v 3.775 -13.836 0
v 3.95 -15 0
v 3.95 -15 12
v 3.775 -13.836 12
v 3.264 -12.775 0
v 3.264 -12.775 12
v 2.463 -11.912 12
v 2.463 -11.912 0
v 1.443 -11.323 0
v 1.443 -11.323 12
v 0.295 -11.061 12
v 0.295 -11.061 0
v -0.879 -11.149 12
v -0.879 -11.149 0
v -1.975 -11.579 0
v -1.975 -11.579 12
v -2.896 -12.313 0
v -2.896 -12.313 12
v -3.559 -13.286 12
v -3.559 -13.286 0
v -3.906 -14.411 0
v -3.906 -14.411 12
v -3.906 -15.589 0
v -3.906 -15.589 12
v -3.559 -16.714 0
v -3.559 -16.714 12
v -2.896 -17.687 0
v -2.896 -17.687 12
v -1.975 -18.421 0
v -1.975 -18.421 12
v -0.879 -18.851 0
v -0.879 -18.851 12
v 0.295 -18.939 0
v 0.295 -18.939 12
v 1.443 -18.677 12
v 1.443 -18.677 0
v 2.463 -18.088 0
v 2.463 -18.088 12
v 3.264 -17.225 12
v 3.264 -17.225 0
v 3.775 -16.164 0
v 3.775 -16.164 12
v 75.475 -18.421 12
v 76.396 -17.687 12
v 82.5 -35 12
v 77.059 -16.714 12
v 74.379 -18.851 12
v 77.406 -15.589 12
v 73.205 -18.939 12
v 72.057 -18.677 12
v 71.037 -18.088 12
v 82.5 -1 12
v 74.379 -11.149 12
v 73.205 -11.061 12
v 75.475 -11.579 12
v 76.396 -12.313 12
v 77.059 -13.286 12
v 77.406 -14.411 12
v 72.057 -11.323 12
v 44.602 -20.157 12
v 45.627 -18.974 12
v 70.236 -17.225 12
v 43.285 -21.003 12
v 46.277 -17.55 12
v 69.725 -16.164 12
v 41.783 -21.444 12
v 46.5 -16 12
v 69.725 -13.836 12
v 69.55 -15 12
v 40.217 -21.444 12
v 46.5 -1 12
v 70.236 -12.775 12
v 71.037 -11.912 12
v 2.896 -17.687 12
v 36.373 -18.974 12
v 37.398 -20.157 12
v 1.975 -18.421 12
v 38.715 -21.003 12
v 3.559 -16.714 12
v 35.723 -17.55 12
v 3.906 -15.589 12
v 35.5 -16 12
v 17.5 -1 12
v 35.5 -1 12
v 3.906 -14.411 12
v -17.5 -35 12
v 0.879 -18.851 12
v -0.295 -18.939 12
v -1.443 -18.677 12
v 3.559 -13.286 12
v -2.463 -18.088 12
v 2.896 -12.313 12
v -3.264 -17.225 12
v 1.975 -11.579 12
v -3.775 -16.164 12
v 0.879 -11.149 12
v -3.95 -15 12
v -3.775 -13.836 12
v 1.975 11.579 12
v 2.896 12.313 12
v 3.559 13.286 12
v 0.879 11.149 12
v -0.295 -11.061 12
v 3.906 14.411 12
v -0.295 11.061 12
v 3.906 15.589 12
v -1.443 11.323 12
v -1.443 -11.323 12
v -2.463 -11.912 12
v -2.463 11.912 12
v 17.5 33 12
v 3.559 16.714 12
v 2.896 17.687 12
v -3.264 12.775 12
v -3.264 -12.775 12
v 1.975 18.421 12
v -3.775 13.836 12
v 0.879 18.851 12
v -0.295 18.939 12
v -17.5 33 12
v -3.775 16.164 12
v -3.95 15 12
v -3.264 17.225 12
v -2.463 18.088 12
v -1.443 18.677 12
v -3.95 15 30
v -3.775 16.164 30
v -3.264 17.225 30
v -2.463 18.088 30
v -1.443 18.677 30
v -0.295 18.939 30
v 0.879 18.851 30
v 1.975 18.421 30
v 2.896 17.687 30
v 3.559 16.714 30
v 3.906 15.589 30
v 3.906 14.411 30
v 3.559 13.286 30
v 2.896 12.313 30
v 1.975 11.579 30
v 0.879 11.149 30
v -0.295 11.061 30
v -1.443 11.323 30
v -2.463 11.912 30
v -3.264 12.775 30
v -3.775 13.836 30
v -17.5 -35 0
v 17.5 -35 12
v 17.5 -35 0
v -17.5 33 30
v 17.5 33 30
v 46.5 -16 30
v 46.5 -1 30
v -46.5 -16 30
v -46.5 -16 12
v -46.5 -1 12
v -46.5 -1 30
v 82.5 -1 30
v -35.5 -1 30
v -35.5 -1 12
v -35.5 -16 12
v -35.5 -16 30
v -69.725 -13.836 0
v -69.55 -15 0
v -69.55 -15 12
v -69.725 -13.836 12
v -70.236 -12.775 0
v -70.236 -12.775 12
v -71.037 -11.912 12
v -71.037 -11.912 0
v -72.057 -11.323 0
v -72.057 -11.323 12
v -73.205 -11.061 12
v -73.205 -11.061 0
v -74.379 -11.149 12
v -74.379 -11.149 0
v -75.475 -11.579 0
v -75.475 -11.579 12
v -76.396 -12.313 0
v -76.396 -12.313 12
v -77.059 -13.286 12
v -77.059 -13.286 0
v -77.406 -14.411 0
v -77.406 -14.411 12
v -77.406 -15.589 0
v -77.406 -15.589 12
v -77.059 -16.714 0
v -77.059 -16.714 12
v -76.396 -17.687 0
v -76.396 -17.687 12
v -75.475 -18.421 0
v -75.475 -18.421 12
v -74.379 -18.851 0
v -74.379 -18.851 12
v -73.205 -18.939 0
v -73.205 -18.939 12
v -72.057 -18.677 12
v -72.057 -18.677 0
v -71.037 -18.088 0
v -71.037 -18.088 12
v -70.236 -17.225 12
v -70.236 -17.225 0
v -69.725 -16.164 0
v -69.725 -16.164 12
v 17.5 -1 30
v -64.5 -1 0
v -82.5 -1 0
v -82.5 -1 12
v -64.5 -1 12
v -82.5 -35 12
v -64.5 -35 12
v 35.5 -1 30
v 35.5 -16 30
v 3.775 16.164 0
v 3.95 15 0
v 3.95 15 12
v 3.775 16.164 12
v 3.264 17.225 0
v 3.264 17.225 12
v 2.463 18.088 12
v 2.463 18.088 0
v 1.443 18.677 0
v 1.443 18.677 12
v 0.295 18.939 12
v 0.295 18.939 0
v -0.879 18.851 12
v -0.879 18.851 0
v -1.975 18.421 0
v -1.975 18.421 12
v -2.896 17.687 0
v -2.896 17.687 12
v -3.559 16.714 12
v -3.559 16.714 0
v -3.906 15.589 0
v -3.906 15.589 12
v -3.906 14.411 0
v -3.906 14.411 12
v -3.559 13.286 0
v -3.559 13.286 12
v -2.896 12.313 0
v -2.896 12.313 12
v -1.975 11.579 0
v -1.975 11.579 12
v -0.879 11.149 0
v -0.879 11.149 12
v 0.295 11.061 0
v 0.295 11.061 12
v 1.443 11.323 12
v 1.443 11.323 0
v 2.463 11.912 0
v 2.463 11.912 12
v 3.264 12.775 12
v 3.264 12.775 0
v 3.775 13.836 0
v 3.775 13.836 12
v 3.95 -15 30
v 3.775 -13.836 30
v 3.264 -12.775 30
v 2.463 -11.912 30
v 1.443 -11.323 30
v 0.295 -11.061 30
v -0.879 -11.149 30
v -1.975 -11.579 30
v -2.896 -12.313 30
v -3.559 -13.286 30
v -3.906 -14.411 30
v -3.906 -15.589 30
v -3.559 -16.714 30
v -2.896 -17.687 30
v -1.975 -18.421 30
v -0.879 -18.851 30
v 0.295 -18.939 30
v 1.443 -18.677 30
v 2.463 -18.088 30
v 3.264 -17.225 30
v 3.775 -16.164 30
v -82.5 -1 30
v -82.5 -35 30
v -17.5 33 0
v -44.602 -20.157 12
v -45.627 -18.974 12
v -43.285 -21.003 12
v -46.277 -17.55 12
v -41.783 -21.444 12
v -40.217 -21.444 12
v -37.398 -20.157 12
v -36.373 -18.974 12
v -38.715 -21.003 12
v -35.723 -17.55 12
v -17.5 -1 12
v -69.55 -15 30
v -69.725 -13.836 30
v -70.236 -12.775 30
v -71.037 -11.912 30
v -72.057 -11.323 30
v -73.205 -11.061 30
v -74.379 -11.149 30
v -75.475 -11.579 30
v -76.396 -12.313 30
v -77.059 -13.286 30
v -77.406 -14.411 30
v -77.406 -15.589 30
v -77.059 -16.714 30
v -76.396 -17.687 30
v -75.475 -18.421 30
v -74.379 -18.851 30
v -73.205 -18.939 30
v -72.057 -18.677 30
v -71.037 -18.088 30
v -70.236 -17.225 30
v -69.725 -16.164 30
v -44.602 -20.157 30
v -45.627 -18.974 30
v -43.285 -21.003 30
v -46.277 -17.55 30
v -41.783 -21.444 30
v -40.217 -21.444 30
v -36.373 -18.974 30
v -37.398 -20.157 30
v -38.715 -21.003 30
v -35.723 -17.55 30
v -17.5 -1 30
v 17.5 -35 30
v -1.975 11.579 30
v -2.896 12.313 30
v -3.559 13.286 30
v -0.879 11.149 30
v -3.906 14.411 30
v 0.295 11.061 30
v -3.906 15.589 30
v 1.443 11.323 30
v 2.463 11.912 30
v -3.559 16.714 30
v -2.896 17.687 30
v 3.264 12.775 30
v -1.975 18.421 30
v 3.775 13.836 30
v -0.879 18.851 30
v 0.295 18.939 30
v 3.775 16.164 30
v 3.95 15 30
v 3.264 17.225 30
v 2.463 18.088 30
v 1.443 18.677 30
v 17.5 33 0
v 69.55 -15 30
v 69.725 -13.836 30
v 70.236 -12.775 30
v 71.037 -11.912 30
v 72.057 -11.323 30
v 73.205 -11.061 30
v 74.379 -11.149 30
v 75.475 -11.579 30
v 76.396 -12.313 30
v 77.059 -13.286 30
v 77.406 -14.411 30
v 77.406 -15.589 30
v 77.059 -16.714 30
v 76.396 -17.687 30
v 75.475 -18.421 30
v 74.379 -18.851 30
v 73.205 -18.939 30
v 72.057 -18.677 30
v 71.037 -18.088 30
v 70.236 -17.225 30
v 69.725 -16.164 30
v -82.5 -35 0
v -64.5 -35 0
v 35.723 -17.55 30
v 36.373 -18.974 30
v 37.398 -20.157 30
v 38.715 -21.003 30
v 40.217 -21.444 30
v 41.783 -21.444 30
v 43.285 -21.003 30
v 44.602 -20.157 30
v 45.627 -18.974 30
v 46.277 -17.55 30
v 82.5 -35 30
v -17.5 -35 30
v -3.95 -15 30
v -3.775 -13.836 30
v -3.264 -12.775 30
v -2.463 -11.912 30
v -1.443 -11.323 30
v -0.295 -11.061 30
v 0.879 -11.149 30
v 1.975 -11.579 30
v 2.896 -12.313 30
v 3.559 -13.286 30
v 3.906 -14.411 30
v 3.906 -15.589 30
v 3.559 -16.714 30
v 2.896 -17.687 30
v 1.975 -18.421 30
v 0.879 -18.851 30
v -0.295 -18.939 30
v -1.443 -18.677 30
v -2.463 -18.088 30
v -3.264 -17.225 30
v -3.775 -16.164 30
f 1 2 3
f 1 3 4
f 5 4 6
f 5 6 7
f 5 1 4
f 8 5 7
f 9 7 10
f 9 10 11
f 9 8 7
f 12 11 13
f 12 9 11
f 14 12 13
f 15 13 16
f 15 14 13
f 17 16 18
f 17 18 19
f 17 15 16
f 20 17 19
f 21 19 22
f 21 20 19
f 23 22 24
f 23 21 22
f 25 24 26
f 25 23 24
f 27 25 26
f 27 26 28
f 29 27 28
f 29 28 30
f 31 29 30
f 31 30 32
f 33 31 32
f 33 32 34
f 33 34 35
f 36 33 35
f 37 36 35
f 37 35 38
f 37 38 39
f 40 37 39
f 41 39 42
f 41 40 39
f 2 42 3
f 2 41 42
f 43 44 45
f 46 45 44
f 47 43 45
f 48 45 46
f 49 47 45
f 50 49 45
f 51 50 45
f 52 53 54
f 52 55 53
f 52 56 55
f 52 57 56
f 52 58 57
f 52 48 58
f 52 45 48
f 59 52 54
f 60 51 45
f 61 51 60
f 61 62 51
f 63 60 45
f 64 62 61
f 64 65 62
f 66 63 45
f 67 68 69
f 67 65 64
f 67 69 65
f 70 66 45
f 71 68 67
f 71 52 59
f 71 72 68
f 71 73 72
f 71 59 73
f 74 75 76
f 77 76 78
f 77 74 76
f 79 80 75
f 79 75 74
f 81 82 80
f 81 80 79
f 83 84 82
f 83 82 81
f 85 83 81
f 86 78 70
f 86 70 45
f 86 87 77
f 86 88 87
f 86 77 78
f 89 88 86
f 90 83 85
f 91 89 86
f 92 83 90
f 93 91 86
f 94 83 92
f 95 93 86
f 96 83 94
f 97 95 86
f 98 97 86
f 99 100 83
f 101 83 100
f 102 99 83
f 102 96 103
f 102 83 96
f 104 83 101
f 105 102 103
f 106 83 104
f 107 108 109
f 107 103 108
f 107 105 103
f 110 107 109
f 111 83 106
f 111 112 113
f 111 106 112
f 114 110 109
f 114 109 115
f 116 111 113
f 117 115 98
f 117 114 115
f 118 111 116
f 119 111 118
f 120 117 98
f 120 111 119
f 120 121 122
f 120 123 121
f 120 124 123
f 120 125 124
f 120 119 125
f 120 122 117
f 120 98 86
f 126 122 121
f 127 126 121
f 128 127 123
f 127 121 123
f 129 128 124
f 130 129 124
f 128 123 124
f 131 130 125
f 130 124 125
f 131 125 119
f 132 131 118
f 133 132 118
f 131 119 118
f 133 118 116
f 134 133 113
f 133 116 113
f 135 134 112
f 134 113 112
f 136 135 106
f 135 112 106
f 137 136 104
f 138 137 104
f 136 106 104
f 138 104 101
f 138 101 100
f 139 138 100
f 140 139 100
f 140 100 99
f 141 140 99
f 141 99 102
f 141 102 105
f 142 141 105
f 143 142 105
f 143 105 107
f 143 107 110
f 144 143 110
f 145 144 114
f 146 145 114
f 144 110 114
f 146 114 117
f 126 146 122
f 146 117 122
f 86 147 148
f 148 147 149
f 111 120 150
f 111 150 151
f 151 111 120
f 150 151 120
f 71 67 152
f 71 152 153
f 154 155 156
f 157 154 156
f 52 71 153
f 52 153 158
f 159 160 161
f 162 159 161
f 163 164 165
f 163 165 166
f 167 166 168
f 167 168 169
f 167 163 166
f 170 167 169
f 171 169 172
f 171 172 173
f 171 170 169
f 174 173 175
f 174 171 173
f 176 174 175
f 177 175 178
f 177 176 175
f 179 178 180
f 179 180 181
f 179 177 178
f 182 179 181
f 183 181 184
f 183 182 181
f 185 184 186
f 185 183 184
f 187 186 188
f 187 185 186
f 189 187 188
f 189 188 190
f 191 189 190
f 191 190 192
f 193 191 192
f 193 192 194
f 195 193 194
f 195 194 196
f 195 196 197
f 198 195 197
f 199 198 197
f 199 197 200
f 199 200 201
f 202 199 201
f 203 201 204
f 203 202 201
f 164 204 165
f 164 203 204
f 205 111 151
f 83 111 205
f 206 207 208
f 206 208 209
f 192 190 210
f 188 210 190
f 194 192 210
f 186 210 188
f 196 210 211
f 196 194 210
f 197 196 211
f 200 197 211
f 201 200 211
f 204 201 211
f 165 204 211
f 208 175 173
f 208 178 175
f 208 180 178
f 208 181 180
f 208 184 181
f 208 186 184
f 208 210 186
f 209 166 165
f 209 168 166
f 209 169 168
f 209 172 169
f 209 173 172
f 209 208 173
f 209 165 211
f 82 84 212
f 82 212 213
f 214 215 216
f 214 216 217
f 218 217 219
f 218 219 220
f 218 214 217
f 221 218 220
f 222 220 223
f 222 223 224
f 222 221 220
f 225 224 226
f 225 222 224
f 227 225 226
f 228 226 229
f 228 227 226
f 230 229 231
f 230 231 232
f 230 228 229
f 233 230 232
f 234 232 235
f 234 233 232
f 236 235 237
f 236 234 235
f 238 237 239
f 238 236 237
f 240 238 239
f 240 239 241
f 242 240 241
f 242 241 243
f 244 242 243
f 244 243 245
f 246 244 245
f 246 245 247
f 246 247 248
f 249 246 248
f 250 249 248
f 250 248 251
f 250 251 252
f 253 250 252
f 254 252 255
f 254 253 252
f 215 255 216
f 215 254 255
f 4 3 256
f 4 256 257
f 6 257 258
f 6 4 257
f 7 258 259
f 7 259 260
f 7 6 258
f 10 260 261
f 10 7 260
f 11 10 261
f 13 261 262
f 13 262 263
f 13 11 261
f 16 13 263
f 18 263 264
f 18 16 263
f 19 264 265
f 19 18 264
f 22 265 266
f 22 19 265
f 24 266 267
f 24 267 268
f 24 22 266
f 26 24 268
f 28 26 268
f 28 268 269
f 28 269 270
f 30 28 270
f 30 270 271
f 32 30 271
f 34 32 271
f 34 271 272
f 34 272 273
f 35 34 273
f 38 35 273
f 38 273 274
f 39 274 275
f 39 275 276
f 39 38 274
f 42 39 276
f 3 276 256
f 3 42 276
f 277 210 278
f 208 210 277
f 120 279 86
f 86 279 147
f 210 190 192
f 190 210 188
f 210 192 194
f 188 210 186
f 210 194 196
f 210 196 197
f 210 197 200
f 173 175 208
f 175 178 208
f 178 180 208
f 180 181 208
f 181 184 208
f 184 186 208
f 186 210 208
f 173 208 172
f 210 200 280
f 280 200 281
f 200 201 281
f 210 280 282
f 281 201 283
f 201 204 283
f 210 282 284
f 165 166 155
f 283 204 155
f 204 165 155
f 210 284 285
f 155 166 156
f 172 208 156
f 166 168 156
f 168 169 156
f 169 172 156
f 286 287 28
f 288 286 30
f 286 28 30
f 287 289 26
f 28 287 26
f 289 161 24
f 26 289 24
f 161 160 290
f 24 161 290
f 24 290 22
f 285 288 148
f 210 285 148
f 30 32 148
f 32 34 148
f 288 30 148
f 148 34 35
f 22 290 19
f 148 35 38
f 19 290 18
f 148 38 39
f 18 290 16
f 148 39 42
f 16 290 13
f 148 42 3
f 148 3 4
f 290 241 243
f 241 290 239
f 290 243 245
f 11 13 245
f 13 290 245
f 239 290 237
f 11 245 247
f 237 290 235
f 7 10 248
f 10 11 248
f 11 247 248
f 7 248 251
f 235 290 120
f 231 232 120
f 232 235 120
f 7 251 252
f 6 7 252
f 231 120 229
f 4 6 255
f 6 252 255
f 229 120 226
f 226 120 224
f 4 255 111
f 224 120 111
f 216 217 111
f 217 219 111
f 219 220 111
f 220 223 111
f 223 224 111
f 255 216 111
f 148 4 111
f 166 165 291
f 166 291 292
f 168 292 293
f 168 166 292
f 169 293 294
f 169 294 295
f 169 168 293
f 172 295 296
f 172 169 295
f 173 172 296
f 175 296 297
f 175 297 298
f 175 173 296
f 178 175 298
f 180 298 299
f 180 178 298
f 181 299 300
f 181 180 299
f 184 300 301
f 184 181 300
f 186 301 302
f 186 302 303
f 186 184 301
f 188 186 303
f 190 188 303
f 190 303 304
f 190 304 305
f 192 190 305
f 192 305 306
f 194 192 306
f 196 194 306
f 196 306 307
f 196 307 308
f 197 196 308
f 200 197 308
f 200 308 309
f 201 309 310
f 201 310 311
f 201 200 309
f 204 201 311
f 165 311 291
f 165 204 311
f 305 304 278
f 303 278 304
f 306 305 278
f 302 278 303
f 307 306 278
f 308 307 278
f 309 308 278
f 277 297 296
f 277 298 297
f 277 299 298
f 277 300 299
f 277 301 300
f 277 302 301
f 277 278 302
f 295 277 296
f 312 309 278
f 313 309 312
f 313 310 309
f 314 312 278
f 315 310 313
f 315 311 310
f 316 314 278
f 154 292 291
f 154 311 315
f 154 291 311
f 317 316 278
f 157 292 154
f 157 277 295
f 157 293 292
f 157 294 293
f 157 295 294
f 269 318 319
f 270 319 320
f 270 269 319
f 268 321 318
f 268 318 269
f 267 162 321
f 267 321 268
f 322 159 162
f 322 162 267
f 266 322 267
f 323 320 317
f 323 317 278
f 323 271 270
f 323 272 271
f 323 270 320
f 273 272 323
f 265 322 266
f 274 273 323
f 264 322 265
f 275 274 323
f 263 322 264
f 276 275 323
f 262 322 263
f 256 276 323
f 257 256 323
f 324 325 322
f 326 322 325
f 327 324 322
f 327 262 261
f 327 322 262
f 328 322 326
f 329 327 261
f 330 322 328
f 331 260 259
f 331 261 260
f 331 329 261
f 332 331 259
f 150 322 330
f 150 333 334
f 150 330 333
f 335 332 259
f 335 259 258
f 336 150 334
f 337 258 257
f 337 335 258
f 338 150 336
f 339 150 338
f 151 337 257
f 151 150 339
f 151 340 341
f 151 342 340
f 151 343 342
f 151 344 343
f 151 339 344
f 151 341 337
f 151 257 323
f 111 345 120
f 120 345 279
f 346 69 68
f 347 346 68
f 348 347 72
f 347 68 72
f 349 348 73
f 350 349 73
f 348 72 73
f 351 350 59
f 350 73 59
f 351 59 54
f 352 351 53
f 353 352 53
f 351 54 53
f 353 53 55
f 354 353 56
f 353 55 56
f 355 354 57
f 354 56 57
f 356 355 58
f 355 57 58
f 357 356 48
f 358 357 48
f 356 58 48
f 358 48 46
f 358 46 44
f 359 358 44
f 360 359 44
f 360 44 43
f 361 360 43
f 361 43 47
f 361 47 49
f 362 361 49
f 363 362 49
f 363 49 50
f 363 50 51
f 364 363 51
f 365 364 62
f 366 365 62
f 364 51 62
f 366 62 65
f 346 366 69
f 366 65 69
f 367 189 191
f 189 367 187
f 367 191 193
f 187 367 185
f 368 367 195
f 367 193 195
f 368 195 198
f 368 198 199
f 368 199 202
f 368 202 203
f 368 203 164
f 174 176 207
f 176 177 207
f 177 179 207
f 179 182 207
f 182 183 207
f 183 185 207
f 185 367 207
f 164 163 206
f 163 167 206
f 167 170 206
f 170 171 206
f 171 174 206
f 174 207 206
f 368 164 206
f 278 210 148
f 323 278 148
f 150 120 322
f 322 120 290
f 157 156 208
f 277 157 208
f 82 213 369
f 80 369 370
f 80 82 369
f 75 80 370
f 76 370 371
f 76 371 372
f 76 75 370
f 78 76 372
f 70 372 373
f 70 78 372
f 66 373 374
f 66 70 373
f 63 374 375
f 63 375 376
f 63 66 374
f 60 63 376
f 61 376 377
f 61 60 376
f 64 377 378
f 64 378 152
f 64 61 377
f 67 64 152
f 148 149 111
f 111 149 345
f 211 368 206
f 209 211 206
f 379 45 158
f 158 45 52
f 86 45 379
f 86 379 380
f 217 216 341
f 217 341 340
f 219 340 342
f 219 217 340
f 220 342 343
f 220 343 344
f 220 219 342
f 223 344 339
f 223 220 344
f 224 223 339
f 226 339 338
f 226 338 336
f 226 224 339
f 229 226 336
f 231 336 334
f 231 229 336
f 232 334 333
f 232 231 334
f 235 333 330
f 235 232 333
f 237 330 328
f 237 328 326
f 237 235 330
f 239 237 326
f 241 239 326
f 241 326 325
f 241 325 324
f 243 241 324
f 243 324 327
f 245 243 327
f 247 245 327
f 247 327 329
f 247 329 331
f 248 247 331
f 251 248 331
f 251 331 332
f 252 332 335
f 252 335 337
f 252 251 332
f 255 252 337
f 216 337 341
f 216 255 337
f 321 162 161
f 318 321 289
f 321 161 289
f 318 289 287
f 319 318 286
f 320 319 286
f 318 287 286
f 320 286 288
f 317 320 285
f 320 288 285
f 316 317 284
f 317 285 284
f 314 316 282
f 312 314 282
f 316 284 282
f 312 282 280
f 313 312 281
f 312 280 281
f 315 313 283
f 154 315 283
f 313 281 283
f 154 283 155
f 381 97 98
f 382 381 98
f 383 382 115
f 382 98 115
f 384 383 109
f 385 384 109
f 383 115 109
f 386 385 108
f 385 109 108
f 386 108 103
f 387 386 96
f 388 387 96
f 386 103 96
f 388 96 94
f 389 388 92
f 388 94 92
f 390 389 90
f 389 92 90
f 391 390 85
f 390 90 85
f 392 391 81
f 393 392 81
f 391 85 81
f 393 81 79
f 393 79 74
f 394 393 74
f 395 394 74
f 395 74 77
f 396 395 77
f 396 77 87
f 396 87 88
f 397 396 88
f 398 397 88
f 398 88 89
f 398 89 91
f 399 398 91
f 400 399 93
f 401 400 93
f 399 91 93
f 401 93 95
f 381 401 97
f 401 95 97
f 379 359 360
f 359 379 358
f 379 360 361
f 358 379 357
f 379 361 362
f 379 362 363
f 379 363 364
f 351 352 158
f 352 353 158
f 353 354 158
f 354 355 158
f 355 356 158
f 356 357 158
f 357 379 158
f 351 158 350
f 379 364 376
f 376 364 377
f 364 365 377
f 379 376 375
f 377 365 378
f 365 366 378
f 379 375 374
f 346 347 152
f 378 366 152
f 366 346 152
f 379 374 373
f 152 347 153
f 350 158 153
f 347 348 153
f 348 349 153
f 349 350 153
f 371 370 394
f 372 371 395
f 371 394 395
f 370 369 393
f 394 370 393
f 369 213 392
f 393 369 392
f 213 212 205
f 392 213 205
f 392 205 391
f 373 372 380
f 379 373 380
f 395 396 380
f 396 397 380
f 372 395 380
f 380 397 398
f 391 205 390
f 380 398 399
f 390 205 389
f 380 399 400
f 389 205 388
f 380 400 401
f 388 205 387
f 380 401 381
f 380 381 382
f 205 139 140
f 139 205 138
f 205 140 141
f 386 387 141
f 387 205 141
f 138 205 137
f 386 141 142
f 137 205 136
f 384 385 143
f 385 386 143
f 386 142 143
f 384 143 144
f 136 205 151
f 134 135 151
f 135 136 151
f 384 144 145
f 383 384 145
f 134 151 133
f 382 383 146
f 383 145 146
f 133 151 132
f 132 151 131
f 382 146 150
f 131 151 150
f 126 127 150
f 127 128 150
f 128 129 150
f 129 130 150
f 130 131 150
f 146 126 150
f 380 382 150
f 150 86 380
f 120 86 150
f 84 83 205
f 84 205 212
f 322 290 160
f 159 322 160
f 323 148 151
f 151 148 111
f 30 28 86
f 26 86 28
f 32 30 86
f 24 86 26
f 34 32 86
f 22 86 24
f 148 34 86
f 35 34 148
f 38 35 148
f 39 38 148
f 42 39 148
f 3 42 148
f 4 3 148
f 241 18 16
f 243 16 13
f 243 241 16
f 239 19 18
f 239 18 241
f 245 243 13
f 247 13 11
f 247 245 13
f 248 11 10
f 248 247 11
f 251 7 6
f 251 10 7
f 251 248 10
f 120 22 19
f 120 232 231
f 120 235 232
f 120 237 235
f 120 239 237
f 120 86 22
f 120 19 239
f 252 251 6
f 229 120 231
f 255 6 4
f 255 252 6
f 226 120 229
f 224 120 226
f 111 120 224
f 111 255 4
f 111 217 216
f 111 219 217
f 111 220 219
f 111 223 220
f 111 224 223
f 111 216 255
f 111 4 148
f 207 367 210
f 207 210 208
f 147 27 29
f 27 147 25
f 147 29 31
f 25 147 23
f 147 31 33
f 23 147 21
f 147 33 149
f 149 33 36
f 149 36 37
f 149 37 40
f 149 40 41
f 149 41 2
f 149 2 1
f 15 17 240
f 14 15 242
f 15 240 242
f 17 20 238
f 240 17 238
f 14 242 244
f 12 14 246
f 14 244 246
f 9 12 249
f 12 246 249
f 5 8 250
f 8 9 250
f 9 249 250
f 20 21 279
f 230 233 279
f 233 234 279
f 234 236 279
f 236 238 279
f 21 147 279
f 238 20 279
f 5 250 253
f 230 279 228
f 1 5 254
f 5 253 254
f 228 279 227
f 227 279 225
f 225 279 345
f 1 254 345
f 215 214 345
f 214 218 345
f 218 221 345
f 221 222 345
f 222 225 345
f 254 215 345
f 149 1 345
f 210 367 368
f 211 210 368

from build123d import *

# Parameters (mm, degrees)
F0_W     = 18
F0_H     = 34
F0_R     = 3.95
F1_DEPTH = 12
F2_START = 12
F2_DEPTH = 18


with BuildPart() as f1:
    # F0 (on Top) → F1 (new body)
    with BuildSketch(Plane.XY):
        with Locations((-73.5, -18)):
            Rectangle(F0_W, F0_H)
        with Locations((-73.5, -15)):
            Circle(F0_R, mode=Mode.SUBTRACT)
    extrude(amount=F1_DEPTH)


with BuildPart() as f1b:
    # F0 (on Top) → F1, piece 2 (new body)
    with BuildSketch(Plane.XY):
        Polygon((17.5, 33), (-17.5, 33), (-17.5, -1), (-17.5, -35), (17.5, -35), align=None)
        with Locations((0, -15)):
            Circle(F0_R, mode=Mode.SUBTRACT)
        with Locations((0, 15)):
            Circle(F0_R, mode=Mode.SUBTRACT)
    extrude(amount=F1_DEPTH)


with BuildPart() as f2:
    # F0 (on Top) → F2 (new body)
    with BuildSketch(Plane.XY.offset(F2_START)):
        with Locations((-73.5, -18)):
            Rectangle(F0_W, F0_H)
        with Locations((-73.5, -15)):
            Circle(F0_R, mode=Mode.SUBTRACT)
        with BuildLine():
            Line((-17.5, -35), (-17.5, -1))
            Line((-17.5, -1), (-35.5, -1))
            Line((-35.5, -1), (-35.5, -16))
            ThreePointArc((-35.5, -16), (-41, -21.5), (-46.5, -16))
            Line((-46.5, -16), (-46.5, -1))
            Line((-46.5, -1), (-64.5, -1))
            Line((-64.5, -1), (-64.5, -35))
            Line((-64.5, -35), (-17.5, -35))
        make_face()
        Polygon((17.5, 33), (-17.5, 33), (-17.5, -1), (-17.5, -35), (17.5, -35), align=None)
        with Locations((0, -15)):
            Circle(F0_R, mode=Mode.SUBTRACT)
        with Locations((0, 15)):
            Circle(F0_R, mode=Mode.SUBTRACT)
    extrude(amount=F2_DEPTH)


with BuildPart() as f3_1:
    # F3: instance of F2
    add(f2.part.mirror(Plane.YZ))


solid = Compound([f1.part, f1b.part, f2.part, f3_1.part])
